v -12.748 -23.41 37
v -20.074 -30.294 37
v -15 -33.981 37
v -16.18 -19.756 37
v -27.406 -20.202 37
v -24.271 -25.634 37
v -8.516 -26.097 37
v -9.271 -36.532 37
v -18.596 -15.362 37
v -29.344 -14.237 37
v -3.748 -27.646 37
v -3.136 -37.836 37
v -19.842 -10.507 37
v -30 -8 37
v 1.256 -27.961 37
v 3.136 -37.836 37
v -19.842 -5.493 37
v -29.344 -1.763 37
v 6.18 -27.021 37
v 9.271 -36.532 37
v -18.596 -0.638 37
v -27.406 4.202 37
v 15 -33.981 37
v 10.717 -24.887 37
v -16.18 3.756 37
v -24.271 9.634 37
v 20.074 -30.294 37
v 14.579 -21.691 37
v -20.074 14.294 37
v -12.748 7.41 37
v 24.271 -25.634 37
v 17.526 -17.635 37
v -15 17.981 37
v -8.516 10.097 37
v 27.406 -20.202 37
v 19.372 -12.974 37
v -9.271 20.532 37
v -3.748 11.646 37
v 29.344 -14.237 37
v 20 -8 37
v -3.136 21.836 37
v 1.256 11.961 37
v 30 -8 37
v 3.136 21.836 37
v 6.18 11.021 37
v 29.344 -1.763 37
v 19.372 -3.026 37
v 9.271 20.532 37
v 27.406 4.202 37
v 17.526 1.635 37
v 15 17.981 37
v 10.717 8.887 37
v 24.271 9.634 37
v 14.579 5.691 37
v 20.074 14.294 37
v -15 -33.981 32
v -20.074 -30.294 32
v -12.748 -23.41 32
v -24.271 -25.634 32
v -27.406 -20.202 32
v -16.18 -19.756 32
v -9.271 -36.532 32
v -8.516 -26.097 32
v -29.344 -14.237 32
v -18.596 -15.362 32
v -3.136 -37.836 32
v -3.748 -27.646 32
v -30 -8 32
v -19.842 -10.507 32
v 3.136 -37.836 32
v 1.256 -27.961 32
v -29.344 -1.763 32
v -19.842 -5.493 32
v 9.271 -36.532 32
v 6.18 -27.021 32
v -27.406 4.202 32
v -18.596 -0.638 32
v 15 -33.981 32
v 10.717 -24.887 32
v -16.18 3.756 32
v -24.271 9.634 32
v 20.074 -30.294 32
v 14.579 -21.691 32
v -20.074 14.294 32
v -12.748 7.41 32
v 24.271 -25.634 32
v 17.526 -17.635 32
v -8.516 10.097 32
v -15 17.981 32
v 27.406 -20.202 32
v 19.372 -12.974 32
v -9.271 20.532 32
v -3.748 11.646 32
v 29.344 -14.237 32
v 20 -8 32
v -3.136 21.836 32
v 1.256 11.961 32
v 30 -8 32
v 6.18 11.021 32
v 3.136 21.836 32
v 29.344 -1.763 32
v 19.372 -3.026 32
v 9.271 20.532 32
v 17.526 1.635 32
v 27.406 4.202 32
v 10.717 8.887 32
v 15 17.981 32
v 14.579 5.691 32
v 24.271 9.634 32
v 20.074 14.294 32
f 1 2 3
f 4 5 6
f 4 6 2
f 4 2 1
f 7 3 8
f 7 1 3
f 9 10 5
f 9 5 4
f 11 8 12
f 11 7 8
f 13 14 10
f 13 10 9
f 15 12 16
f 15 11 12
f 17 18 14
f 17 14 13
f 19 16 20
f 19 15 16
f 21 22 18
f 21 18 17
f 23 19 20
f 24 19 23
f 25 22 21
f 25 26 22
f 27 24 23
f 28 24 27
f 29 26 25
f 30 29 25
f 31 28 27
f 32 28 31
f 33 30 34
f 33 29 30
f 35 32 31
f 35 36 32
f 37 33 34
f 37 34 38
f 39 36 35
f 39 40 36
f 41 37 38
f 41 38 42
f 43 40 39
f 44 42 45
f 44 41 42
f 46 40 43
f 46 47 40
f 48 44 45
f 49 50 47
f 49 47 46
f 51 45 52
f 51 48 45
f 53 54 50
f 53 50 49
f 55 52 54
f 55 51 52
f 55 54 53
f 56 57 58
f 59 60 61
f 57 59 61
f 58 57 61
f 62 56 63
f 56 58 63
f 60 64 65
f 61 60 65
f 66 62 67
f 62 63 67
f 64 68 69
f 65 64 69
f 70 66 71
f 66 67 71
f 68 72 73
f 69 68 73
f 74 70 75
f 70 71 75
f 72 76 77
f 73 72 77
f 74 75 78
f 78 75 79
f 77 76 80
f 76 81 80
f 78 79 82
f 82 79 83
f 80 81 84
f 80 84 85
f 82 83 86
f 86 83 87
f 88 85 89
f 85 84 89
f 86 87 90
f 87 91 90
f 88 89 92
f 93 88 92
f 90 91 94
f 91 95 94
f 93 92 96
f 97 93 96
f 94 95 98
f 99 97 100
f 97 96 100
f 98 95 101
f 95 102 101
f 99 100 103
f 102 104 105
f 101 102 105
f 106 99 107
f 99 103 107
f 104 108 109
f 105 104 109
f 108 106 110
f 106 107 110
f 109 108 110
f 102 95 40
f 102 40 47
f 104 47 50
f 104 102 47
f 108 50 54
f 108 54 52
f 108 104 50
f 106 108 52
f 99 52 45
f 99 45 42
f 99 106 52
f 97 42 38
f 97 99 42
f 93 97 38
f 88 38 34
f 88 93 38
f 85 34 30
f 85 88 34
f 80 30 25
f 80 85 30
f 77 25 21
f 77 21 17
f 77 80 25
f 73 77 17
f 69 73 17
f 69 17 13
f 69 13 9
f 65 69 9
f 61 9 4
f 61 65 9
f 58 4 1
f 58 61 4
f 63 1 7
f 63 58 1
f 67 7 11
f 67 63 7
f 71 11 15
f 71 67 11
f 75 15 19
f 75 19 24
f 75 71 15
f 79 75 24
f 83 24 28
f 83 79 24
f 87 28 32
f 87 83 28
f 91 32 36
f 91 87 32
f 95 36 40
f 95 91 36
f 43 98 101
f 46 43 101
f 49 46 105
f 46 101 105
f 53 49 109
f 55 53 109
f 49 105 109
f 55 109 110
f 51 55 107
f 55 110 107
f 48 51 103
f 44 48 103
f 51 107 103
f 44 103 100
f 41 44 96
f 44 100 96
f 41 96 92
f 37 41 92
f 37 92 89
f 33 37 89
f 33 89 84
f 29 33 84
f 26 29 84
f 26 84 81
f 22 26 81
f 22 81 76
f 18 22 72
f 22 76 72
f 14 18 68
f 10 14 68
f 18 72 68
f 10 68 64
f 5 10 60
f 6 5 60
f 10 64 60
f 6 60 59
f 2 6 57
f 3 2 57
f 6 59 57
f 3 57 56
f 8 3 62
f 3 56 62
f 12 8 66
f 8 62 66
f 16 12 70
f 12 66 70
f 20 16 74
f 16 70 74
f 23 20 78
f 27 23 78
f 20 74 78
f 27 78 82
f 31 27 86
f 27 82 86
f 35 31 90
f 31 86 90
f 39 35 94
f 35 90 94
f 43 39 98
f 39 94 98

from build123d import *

# Parameters (mm, degrees)
CYLINDER729_R     = 20
CYLINDER729_DEPTH = 5
CYLINDER728_R     = 30
CYLINDER728_DEPTH = 5


with BuildPart() as cylinder799:
    # Cylinder729 → Cylinder729 (new body)
    with BuildSketch(Plane(origin=(0, -8, 28), x_dir=(1, 0, 0), z_dir=(0, 0, 1))):
        Circle(CYLINDER729_R)
    extrude(amount=CYLINDER729_DEPTH)


with BuildPart() as bearing:
    # Cylinder728 → Cylinder728 (new body)
    with BuildSketch(Plane(origin=(0, -8, 28), x_dir=(1, 0, 0), z_dir=(0, 0, 1))):
        Circle(CYLINDER728_R)
    extrude(amount=CYLINDER728_DEPTH)

    # Cut012035013: cut Cylinder799
    add(cylinder799.part, mode=Mode.SUBTRACT)


with BuildPart() as bearing_1:
    # Cut012035013 placement: moved
    add(bearing.part.moved(Location((0, 0, 4))))


solid = bearing_1.part
